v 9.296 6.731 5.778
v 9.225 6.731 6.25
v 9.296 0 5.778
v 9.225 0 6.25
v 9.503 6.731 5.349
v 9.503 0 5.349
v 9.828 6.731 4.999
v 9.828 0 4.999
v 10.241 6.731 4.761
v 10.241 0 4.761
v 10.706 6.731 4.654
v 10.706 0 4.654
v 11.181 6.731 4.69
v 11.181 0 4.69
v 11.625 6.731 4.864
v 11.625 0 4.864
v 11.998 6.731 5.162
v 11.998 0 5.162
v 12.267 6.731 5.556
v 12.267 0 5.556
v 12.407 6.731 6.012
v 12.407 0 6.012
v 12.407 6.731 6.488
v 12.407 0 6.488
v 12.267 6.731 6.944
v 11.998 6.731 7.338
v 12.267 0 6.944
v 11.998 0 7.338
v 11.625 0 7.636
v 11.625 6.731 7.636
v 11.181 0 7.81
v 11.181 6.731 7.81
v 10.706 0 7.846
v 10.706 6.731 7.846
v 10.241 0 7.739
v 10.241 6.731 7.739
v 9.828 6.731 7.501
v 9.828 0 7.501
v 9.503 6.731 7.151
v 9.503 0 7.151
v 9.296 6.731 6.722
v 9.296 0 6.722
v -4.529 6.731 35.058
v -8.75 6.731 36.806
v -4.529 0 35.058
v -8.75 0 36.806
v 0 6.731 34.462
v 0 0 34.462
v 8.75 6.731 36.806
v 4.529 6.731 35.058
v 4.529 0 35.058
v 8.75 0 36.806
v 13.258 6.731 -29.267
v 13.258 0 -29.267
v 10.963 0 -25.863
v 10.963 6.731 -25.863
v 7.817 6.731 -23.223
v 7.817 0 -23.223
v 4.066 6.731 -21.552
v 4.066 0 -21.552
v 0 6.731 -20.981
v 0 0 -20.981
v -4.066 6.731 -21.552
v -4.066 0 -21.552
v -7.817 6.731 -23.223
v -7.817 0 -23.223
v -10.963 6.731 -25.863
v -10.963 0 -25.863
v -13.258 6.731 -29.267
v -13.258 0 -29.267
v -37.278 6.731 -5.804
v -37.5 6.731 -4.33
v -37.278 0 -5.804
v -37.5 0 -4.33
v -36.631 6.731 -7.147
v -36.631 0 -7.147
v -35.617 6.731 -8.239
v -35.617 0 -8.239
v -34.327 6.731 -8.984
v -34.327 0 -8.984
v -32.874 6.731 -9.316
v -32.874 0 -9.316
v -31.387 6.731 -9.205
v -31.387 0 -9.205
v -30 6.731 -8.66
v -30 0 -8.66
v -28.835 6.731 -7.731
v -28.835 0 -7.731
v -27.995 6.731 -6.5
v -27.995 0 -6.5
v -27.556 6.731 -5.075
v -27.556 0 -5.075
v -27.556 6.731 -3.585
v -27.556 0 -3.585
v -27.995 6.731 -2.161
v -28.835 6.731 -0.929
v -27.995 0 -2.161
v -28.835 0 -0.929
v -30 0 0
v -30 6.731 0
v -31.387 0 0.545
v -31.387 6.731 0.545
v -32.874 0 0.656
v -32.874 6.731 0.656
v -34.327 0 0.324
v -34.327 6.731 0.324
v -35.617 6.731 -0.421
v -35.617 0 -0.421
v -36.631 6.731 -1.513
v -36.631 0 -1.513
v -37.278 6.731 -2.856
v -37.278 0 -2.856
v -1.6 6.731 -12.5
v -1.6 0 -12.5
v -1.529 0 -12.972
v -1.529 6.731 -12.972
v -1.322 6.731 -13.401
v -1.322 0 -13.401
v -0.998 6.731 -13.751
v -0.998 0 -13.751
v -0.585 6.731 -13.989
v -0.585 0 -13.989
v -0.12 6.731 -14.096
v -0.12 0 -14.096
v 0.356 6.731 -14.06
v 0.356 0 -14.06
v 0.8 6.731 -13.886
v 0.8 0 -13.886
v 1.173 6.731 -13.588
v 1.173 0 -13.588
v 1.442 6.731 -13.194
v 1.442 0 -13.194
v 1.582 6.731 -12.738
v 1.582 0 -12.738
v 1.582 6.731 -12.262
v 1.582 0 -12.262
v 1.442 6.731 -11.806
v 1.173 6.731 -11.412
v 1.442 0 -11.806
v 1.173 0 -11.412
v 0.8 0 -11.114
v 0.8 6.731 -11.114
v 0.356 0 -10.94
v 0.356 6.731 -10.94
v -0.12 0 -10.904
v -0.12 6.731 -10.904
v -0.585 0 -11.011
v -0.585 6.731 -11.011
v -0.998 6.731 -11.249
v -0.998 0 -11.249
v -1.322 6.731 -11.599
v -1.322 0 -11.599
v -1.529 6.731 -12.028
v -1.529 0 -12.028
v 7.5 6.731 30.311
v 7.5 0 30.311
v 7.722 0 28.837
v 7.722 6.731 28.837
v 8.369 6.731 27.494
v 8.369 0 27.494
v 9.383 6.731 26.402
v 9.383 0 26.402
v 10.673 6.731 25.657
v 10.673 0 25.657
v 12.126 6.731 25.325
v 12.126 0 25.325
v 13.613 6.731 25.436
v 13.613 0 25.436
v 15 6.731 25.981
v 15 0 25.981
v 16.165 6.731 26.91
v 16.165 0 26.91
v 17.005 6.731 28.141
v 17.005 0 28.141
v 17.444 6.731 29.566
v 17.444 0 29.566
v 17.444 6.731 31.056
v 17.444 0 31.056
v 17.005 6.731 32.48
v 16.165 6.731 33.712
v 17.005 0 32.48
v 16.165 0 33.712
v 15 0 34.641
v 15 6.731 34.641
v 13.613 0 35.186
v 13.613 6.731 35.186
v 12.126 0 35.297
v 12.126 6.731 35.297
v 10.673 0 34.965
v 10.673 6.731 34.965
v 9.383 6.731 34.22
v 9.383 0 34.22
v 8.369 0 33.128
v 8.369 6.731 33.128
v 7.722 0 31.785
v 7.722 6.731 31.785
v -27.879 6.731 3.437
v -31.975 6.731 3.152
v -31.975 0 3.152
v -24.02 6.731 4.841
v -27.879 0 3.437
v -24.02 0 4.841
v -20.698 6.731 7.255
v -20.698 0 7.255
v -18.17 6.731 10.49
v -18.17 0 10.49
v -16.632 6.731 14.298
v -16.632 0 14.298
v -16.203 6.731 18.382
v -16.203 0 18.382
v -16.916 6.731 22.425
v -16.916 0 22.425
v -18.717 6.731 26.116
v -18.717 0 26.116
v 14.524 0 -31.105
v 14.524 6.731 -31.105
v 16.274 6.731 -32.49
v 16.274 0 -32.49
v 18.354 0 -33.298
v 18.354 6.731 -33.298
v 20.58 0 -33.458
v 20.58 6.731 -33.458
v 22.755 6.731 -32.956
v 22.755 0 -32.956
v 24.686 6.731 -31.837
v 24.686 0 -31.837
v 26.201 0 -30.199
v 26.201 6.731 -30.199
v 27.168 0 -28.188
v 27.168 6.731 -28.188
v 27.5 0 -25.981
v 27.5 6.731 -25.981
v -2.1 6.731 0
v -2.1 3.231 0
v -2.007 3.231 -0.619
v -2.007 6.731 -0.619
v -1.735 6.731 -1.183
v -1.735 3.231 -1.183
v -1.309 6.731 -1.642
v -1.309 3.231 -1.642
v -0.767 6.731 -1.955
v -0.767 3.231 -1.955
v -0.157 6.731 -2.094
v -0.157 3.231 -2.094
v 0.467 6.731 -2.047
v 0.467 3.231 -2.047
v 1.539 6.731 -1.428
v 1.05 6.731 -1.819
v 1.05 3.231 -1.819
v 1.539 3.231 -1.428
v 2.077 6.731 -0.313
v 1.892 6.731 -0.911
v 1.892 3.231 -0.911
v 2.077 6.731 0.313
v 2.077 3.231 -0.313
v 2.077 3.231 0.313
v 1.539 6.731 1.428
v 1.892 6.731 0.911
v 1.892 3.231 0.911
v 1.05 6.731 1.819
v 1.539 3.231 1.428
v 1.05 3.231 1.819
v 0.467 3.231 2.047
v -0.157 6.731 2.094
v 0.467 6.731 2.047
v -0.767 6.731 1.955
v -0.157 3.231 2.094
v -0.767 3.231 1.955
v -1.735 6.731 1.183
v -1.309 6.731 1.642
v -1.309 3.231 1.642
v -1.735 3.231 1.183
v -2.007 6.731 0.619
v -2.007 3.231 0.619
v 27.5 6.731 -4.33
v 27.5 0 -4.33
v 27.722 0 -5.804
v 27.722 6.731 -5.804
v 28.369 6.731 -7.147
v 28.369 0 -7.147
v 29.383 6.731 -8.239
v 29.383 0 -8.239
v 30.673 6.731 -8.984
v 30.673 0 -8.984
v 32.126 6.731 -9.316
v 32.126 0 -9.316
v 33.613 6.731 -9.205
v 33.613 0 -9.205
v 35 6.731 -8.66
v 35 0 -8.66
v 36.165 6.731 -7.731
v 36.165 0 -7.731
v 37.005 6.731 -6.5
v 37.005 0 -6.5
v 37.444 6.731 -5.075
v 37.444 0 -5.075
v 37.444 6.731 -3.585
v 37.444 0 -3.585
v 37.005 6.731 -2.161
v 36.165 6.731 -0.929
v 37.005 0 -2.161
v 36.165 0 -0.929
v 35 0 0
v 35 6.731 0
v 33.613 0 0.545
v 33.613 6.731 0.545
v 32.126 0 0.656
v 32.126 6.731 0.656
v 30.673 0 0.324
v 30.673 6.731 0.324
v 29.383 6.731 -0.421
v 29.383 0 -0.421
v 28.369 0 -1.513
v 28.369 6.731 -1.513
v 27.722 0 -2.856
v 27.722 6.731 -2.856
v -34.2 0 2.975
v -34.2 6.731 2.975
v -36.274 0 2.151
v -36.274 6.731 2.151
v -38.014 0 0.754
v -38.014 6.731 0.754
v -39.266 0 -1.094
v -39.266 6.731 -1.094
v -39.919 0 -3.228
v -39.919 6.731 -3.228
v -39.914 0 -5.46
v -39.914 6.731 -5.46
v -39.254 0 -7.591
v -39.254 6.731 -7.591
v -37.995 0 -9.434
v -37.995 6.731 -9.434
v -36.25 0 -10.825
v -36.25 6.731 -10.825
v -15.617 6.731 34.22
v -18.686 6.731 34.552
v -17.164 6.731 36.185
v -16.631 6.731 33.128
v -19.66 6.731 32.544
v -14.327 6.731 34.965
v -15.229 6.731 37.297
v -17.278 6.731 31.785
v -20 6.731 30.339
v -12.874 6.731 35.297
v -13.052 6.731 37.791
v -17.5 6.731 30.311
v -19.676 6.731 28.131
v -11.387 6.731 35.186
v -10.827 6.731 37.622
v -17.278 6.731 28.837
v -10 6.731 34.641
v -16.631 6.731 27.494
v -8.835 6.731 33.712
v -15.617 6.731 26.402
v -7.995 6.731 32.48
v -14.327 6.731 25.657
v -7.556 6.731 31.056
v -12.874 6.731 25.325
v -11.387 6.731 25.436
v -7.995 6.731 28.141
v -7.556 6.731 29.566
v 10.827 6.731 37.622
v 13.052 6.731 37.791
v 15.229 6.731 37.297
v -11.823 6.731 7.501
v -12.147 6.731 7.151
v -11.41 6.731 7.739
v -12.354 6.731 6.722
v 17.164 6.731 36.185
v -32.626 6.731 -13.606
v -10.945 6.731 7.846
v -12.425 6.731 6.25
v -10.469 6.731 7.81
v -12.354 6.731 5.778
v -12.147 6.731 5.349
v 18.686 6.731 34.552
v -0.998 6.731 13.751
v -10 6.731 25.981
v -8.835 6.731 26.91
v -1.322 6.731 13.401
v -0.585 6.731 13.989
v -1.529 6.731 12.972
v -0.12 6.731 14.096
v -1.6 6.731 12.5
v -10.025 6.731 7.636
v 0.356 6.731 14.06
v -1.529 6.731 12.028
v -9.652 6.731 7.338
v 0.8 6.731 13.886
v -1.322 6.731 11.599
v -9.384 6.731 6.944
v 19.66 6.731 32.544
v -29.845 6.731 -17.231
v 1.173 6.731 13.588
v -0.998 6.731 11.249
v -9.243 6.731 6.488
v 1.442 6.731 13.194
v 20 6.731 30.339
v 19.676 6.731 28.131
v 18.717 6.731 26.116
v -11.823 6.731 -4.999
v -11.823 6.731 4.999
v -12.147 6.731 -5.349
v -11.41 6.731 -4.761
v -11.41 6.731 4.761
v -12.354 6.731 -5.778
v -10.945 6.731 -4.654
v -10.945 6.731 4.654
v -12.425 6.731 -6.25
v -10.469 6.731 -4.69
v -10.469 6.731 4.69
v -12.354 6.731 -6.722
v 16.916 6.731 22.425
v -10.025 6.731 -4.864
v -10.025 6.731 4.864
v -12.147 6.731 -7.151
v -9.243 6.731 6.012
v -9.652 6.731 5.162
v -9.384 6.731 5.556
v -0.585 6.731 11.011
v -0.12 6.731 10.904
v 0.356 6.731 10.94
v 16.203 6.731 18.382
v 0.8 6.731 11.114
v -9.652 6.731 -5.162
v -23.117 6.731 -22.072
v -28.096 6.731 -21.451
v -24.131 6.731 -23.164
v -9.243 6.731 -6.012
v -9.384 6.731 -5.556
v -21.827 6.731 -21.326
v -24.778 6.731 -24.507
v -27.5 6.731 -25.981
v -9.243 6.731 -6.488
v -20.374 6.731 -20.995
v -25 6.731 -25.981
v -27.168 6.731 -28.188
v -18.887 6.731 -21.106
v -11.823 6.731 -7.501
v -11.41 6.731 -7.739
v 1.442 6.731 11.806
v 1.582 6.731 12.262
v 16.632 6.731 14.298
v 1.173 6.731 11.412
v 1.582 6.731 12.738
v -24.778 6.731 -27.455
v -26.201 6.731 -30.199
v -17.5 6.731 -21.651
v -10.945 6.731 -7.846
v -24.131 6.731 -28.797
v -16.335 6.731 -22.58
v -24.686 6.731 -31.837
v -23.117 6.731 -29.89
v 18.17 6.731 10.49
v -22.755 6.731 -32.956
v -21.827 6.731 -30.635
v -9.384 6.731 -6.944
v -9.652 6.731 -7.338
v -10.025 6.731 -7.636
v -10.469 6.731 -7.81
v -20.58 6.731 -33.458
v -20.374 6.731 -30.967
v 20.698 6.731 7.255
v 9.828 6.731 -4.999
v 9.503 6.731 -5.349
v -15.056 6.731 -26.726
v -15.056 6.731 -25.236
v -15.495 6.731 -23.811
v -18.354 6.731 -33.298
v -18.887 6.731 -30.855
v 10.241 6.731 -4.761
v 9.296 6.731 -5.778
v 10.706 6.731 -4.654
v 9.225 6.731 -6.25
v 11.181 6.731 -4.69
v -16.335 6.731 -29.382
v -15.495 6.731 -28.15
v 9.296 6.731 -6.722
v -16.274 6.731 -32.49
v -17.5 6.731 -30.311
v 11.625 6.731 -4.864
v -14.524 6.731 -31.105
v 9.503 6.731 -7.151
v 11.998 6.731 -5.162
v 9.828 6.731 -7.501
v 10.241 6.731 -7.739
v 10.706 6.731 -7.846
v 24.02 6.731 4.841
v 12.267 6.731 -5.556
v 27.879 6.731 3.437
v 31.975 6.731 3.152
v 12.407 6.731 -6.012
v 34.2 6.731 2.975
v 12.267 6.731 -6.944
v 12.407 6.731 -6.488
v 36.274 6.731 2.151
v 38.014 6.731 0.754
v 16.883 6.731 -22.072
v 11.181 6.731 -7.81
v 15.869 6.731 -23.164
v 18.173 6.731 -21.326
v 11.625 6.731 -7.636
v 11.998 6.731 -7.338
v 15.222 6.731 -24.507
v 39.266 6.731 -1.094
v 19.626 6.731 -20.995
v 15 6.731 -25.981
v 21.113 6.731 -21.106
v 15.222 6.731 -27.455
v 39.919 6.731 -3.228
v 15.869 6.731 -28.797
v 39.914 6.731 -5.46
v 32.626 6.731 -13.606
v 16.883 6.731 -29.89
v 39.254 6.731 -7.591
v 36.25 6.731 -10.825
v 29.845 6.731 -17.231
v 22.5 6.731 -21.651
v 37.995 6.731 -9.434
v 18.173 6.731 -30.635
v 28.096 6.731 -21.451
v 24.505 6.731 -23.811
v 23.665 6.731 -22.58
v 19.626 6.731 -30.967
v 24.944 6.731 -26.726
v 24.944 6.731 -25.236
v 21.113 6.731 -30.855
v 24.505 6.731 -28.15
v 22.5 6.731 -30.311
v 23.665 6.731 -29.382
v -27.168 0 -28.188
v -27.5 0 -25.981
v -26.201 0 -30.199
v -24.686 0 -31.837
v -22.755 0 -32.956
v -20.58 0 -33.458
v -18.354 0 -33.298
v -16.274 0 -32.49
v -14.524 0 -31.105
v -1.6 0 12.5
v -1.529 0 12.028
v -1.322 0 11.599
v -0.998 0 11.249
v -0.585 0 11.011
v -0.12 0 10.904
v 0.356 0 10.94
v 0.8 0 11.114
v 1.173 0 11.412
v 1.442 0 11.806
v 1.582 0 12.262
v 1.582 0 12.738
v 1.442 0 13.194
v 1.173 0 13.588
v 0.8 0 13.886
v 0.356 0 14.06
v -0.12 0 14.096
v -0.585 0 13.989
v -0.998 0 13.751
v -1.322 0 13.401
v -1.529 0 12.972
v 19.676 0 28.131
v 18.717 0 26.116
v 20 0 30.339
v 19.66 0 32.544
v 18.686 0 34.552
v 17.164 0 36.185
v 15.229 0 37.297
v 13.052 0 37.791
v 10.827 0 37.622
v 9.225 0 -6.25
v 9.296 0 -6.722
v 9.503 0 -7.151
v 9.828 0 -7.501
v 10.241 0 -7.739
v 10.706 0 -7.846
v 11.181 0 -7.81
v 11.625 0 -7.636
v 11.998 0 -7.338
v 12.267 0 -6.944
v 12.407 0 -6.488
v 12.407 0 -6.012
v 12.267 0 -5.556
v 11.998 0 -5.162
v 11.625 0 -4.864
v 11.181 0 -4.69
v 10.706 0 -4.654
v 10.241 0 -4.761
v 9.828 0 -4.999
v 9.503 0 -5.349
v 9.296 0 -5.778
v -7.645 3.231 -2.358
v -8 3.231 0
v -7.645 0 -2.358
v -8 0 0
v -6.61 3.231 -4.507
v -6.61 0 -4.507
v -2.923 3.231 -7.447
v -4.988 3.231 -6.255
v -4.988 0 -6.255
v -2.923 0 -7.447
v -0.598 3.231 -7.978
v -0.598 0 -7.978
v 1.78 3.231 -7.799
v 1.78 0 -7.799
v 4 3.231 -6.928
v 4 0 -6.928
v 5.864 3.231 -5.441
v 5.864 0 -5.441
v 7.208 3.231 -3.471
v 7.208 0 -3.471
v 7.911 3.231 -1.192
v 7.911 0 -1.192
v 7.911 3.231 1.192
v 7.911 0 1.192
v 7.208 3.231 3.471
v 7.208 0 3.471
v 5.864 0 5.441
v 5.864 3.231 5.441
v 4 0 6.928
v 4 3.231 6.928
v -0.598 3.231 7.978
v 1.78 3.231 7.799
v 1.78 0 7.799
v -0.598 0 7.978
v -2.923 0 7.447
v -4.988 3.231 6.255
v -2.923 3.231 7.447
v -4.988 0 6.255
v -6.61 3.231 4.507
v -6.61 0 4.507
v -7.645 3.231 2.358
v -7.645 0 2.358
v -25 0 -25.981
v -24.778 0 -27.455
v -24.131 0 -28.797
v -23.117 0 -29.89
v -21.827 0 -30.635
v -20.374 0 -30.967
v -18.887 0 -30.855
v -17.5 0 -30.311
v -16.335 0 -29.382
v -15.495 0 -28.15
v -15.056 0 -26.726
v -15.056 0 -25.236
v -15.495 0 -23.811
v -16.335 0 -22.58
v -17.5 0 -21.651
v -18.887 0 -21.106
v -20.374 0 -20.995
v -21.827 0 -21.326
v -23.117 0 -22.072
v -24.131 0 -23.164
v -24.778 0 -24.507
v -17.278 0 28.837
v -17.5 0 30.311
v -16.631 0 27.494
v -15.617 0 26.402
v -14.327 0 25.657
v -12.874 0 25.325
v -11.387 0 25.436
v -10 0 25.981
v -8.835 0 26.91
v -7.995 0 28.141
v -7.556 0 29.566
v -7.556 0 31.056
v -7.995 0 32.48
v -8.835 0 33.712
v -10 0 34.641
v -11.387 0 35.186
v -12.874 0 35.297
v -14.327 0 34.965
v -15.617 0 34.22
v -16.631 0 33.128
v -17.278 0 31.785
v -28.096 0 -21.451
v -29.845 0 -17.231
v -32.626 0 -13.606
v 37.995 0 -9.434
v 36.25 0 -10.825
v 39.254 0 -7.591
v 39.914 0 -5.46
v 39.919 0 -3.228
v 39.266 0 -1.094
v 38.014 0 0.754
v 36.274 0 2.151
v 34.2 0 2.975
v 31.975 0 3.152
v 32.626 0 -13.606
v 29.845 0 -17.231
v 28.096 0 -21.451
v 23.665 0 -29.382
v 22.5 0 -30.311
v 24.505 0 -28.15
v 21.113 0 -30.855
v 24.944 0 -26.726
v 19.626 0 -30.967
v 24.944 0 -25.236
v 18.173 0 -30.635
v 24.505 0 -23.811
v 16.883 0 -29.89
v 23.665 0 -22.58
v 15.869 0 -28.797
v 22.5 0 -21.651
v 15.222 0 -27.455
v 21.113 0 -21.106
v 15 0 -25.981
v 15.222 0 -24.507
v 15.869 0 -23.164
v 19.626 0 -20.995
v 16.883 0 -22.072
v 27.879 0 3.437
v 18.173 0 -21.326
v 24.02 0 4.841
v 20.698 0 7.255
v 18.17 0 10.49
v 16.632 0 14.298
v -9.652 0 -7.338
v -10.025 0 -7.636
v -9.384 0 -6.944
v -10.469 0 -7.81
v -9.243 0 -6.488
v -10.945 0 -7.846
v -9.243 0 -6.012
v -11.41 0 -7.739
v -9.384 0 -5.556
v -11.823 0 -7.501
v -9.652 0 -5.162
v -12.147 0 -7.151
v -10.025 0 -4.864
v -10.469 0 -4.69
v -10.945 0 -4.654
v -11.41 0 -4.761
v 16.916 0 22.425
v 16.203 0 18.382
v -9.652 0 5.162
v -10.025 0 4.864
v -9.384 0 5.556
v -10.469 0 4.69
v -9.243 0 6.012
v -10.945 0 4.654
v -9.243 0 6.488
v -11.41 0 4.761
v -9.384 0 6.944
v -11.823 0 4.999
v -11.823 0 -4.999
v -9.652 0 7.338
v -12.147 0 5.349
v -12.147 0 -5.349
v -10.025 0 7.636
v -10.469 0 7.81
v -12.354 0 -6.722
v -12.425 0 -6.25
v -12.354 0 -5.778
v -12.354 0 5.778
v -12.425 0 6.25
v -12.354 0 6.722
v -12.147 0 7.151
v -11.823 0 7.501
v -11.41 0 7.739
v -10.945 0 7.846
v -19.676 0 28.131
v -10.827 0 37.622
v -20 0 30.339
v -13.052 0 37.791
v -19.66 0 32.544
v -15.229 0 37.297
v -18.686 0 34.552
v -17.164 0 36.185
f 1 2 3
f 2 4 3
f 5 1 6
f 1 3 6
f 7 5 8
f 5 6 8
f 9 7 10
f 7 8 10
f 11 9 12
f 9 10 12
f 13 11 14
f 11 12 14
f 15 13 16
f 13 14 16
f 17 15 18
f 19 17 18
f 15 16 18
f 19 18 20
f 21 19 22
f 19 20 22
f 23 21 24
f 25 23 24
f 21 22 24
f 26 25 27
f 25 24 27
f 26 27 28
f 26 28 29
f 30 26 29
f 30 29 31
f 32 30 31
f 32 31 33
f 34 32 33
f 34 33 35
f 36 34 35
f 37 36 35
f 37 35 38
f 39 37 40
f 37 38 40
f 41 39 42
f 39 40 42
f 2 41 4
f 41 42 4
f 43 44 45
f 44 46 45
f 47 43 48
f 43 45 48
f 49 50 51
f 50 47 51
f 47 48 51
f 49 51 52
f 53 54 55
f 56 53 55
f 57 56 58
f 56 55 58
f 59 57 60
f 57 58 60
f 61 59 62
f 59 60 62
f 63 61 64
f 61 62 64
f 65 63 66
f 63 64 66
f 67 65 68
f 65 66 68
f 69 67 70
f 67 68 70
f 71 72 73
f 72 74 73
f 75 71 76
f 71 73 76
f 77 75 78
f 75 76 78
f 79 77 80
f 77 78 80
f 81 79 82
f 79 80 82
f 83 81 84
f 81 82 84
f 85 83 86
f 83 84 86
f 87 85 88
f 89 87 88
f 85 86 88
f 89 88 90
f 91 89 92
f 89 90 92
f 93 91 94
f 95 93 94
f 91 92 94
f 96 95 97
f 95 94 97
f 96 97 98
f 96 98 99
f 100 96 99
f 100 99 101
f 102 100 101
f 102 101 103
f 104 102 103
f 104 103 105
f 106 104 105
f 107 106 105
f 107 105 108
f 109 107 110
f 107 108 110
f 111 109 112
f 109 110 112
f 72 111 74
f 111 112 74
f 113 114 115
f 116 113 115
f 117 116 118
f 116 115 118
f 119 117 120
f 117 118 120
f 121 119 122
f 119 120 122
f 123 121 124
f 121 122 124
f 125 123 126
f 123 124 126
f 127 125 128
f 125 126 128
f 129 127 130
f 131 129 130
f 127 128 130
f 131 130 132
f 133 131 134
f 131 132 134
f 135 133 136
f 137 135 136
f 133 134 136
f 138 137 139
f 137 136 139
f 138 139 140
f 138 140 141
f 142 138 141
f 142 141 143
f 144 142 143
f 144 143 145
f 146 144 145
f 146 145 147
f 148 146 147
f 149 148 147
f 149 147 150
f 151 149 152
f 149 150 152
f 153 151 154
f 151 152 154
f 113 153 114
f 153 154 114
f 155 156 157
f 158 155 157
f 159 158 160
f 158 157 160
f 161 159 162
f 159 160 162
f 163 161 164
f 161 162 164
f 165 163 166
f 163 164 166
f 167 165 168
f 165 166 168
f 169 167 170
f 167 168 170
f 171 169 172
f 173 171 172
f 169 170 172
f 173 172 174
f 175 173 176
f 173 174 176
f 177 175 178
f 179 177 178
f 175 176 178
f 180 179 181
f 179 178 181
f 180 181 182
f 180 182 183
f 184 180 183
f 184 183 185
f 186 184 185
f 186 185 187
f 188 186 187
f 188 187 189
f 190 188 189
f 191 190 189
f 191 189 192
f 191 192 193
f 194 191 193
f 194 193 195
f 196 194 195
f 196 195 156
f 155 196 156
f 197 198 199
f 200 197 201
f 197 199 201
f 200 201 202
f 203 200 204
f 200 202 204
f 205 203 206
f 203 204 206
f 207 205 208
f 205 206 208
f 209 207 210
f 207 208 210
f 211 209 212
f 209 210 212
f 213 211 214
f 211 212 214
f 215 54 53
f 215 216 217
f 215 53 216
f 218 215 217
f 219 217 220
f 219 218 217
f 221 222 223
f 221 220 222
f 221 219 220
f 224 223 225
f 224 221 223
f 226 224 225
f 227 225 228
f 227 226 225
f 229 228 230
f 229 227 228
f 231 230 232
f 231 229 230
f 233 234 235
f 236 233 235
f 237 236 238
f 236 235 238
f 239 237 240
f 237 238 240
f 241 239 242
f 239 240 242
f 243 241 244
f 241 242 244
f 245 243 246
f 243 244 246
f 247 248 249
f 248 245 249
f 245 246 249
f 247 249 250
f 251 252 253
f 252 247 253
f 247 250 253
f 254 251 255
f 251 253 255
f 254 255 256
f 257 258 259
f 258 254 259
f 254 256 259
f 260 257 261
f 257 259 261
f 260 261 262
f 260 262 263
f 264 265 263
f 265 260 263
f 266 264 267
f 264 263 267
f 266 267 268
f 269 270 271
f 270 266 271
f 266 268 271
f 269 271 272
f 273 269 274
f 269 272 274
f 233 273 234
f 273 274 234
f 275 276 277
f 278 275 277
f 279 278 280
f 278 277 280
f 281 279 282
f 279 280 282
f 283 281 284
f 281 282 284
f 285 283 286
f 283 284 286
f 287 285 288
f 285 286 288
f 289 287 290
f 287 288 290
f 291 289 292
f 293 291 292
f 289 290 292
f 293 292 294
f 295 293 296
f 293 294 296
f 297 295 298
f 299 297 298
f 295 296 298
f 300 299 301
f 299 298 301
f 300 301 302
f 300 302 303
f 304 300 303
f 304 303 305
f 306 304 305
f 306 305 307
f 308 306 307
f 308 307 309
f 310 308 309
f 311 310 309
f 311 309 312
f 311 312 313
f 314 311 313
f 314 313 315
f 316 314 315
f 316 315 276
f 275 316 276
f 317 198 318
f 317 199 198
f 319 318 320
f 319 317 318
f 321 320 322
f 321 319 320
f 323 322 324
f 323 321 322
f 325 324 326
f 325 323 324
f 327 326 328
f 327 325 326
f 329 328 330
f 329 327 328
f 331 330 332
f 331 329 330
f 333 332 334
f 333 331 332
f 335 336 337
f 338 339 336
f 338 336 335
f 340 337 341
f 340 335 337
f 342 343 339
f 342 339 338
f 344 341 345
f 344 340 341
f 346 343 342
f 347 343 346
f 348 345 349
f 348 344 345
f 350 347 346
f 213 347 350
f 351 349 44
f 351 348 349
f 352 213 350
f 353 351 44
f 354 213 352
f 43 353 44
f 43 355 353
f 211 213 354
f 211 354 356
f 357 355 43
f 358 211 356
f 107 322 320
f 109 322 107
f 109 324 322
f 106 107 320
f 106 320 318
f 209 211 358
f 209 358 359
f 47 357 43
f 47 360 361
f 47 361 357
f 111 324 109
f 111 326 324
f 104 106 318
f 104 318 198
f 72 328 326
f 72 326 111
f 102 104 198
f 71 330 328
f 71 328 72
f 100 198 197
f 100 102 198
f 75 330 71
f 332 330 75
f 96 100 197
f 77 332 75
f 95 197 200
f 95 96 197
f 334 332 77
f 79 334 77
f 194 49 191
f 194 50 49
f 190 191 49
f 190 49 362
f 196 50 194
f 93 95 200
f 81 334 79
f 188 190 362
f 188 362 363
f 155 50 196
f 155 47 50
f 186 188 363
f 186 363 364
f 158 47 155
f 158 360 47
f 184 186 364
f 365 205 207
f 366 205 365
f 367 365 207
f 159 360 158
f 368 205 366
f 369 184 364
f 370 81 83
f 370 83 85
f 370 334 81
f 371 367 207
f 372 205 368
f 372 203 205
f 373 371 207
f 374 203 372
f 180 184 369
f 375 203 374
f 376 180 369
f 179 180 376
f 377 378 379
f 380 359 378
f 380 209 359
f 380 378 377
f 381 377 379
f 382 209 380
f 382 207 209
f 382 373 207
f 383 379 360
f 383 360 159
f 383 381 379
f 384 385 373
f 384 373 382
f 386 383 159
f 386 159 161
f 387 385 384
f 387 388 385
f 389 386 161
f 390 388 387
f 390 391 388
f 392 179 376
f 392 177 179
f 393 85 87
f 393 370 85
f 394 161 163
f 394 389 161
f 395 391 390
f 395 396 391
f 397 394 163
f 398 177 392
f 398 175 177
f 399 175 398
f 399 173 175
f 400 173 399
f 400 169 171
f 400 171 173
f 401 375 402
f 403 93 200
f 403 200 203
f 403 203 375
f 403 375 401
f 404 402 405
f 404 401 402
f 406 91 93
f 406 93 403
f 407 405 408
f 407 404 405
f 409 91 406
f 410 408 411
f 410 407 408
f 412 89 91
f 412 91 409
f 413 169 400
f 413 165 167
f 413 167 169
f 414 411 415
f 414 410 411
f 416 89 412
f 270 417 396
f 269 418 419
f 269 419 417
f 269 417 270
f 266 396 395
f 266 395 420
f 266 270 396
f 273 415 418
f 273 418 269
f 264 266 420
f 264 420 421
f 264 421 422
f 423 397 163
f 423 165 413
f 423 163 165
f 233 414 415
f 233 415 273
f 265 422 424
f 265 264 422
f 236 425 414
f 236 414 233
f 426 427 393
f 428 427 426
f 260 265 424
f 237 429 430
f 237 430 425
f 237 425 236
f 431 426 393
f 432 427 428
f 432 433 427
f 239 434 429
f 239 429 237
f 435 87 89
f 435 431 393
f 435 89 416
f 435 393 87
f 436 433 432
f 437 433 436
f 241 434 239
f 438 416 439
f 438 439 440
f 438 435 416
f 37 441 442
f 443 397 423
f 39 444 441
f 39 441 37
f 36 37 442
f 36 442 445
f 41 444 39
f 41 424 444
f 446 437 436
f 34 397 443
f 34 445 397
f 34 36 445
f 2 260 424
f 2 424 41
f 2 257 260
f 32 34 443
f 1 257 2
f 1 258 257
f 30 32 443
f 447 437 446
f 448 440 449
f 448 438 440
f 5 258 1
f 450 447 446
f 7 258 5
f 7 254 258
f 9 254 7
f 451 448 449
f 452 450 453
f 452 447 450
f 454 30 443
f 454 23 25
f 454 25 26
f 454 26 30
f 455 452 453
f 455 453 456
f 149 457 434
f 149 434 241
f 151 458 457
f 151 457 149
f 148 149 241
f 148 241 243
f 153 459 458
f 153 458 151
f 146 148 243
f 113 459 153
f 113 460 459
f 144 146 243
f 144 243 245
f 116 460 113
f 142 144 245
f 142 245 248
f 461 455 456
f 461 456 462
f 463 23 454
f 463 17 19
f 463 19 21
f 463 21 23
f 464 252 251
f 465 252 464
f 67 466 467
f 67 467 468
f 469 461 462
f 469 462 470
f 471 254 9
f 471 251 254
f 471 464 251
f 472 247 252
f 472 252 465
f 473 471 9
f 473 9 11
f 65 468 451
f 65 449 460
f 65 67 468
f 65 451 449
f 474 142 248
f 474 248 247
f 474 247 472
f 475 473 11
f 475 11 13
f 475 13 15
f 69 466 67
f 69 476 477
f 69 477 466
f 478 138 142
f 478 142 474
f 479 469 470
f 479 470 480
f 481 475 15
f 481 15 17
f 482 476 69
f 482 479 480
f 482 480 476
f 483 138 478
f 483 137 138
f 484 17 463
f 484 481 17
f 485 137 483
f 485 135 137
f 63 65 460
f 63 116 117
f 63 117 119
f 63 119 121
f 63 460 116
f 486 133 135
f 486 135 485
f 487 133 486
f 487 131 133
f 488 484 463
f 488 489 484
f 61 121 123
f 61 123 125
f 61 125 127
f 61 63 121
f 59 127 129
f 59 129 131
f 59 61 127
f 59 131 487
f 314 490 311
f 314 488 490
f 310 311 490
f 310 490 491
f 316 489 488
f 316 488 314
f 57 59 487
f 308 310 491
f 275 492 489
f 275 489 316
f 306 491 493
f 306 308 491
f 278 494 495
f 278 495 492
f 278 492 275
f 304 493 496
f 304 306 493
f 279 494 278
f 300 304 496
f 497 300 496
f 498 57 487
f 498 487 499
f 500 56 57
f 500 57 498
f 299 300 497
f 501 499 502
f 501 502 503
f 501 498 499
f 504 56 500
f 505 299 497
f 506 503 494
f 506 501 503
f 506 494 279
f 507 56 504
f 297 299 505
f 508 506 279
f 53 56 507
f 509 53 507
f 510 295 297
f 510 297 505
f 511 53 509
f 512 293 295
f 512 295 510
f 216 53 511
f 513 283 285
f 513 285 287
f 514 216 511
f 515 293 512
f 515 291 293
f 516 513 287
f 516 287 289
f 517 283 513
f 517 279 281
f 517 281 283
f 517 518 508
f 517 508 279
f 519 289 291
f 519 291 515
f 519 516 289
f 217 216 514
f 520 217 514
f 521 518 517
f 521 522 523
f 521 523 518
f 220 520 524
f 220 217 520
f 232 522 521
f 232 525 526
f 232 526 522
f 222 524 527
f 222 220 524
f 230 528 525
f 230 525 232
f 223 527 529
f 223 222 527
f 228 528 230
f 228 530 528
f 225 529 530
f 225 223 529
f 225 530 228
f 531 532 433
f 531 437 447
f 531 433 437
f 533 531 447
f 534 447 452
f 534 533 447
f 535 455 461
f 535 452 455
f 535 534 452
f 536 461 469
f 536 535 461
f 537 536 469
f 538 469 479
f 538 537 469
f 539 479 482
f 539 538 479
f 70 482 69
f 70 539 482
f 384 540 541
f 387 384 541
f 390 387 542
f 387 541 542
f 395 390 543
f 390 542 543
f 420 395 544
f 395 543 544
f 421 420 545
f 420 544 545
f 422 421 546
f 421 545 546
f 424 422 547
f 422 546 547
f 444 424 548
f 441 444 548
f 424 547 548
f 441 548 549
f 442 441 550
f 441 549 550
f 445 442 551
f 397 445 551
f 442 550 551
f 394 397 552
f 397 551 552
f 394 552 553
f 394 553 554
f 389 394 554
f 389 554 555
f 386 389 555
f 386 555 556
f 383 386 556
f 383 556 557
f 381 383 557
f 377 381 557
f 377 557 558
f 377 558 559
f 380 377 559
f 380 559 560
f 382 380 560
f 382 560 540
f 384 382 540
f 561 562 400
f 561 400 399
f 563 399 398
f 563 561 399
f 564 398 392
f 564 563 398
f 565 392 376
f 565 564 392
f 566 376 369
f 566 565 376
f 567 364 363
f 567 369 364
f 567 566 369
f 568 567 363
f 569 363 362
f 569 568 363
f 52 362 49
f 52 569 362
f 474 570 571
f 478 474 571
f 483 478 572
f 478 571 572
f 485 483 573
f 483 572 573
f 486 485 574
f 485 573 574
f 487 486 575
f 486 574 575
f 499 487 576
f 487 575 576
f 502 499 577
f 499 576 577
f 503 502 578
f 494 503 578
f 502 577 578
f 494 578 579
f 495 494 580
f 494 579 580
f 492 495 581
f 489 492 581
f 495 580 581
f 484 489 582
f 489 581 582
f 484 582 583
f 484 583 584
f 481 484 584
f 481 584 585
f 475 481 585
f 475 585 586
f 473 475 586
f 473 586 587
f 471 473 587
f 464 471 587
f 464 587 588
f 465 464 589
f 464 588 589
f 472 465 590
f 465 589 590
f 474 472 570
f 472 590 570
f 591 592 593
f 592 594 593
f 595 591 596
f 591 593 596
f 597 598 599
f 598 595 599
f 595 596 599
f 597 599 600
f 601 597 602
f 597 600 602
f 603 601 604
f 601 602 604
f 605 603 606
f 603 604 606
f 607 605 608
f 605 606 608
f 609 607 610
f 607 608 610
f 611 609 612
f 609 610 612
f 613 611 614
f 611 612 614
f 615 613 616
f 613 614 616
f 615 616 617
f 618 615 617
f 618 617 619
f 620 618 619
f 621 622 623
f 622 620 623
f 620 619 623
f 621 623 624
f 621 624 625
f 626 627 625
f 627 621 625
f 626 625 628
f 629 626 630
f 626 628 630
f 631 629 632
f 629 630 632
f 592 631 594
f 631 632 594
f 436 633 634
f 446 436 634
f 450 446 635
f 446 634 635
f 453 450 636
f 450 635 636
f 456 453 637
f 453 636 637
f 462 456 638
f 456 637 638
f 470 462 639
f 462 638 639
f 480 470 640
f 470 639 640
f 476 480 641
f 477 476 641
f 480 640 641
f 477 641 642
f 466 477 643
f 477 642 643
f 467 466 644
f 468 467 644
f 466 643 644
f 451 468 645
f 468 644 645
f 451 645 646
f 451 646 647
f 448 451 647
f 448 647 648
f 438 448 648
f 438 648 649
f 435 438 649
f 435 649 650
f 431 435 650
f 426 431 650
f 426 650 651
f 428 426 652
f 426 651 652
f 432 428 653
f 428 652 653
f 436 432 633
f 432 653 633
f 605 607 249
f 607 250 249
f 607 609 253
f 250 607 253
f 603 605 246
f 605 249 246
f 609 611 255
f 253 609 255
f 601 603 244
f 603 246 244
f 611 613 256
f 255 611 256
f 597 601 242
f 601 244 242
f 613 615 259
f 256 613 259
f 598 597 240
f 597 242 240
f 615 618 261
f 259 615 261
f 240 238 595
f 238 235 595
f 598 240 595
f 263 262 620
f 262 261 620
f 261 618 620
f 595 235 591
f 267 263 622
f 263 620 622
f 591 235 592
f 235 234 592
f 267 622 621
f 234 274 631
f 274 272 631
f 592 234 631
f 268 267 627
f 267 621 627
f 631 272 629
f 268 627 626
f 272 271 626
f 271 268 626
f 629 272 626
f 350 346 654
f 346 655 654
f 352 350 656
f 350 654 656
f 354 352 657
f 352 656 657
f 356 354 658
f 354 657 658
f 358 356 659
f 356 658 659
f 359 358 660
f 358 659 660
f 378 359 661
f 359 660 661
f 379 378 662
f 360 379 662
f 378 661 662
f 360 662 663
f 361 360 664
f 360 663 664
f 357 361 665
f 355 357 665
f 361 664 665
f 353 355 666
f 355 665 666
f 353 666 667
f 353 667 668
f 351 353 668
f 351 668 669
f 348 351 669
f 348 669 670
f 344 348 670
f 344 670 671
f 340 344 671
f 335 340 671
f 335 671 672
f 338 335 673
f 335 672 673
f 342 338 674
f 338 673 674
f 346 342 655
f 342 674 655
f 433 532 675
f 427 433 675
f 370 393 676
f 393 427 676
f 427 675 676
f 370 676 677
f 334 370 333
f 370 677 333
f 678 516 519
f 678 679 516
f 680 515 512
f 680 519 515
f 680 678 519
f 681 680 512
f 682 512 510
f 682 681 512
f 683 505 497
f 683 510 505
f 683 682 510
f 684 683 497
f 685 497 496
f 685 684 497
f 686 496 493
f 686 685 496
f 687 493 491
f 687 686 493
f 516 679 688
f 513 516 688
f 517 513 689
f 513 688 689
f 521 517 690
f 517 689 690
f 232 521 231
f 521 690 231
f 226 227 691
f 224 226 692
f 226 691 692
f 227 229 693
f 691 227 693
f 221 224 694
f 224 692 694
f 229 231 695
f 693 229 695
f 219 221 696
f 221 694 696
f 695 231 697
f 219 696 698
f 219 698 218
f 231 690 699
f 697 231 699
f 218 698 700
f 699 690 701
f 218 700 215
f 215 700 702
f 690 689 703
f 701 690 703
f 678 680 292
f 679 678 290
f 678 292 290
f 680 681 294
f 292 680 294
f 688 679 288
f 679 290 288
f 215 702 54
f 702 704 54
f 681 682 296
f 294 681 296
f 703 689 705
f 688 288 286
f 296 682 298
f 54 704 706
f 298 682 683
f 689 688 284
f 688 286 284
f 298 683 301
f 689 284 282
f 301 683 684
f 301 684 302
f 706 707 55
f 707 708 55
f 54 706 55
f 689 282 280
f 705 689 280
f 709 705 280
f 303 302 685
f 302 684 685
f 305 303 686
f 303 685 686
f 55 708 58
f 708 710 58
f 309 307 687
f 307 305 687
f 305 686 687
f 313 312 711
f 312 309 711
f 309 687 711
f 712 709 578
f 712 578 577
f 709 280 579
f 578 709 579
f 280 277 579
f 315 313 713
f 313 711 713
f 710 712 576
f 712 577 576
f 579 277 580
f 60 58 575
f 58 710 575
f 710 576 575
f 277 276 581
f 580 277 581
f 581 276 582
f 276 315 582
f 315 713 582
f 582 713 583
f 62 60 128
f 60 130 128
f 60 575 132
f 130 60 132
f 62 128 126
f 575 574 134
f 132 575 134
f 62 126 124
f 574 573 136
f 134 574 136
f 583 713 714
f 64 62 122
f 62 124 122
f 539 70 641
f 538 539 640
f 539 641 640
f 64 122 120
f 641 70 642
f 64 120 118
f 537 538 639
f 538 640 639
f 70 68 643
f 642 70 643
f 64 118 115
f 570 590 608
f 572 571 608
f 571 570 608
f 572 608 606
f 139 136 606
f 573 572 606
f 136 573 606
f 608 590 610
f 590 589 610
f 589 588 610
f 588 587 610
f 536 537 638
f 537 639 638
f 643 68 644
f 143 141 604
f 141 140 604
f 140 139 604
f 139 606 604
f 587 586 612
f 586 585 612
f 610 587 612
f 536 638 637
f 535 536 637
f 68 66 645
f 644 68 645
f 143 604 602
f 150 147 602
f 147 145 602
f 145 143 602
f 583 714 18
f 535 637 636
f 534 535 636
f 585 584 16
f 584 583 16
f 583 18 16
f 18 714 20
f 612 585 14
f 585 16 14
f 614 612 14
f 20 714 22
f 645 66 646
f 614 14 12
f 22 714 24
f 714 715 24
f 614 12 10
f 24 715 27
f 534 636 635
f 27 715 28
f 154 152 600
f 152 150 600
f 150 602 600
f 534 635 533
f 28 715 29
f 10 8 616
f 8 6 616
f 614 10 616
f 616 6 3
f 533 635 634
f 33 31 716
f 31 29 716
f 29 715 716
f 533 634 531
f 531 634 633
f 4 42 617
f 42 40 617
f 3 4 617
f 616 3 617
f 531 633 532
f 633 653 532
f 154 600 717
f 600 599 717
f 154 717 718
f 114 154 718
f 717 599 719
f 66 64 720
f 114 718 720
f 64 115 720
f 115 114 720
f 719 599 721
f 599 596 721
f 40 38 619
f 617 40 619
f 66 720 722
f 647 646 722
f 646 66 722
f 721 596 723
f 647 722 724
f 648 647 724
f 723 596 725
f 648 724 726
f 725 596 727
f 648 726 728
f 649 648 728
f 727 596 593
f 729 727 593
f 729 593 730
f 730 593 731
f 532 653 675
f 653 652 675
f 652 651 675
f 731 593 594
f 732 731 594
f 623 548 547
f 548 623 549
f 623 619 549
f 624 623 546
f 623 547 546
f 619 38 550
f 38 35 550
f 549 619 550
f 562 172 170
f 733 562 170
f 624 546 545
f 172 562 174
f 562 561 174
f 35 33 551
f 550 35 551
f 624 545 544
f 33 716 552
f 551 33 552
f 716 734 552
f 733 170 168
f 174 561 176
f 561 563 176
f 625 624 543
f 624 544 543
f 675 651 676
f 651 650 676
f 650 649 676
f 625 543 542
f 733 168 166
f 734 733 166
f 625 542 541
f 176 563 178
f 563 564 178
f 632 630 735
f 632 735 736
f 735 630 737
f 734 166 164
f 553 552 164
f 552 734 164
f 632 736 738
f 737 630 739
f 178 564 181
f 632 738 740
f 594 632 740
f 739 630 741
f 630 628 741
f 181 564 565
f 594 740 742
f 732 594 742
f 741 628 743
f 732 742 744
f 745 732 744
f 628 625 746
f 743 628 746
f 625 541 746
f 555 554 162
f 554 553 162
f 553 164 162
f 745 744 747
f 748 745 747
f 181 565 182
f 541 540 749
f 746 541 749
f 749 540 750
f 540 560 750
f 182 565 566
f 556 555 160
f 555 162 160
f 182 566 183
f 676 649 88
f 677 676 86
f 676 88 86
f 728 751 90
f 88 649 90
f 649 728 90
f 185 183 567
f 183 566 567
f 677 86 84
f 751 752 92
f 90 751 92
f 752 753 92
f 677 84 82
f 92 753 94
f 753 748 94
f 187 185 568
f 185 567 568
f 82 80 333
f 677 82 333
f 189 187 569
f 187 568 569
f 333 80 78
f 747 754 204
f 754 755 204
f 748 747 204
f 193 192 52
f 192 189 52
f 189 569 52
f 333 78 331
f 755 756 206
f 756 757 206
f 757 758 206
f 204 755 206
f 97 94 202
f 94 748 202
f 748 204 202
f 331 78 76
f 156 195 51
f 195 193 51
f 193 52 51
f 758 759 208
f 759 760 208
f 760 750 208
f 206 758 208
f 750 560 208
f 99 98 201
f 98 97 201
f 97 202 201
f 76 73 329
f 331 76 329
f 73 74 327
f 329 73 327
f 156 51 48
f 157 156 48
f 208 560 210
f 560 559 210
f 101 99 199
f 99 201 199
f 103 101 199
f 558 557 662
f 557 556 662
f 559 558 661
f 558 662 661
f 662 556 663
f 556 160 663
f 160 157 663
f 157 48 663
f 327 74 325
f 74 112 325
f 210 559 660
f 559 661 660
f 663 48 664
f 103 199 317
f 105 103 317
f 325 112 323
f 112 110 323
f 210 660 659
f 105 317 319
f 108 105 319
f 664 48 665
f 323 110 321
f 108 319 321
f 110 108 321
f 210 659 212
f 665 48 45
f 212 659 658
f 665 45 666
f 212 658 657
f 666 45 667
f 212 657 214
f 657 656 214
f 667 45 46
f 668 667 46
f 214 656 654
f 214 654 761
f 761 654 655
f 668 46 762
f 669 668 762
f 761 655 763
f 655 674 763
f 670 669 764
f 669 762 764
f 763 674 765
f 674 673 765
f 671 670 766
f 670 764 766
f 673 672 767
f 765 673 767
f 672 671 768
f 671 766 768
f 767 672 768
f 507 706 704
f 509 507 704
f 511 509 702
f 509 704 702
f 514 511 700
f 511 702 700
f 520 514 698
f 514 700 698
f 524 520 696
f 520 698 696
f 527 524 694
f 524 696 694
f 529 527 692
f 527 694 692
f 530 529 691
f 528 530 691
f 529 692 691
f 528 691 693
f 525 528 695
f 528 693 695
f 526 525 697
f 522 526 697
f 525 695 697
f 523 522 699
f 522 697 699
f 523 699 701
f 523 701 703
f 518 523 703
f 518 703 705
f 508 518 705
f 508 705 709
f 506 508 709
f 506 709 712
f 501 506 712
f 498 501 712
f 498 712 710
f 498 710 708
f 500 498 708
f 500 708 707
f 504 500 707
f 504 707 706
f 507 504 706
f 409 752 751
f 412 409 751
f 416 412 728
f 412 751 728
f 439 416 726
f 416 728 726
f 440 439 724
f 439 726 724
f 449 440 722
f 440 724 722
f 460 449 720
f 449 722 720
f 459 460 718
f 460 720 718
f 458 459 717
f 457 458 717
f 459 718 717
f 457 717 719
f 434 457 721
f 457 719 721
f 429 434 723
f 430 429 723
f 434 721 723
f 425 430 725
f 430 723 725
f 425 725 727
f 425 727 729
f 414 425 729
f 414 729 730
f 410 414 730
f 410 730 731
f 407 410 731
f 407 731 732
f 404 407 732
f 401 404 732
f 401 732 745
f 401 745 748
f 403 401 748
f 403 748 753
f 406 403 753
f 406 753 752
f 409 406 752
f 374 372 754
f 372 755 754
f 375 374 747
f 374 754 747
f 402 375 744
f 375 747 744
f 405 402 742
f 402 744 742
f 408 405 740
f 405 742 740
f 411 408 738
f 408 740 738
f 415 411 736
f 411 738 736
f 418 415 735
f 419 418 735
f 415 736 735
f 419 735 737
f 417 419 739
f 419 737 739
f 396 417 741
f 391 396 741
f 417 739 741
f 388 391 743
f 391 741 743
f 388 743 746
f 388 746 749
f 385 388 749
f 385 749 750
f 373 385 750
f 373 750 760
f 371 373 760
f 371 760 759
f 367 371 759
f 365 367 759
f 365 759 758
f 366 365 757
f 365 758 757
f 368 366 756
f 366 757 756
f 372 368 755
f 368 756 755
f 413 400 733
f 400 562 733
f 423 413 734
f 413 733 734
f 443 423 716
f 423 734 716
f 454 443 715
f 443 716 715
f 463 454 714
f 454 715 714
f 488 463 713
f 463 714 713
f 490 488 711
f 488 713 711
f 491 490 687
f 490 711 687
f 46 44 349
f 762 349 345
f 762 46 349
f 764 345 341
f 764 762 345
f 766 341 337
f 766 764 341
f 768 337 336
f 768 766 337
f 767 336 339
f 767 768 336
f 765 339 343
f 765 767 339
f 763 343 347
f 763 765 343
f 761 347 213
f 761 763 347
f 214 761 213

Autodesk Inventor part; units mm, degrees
ref_plane "YZ Plane" through (0, 0, 0) normal (1, 0, 0) x (0, 1, 0)
ref_plane "XZ Plane" through (0, 0, 0) normal (0, 1, 0) x (-1, 0, 0)
ref_plane "XY Plane" through (0, 0, 0) normal (0, 0, 1) x (1, 0, 0)
sketch "Sketch1" plane through (0, 0, 0) normal (0, 1, 0) x (-1, 0, 0)
  circle A0 centre (0, 0) radius 2.1
  circle A1 centre (0, 0) radius 8
  circle A2 centre (0, 0) radius 12.5
  circle A3 centre (0, 0) radius 51.9615
  line L0 (-45, -25.9808) -> (-28.034, 3.4052)
  line L1 (0, 51.9615) -> (16.966, 22.5755)
  line L2 (45, -25.9808) -> (11.068, -25.9808)
  circle A4 centre (12.5, 30.3109) radius 5
  circle A5 centre (32.5, -4.3301) radius 5
  circle A6 centre (-12.5, 30.3109) radius 5
  circle A7 centre (-32.5, -4.3301) radius 5
  circle A8 centre (-20, -25.9808) radius 5
  circle A9 centre (20, -25.9808) radius 5
  circle A10 centre (0, 12.5) radius 1.6
  circle A11 centre (-10.8253, 6.25) radius 1.6
  circle A12 centre (-10.8253, -6.25) radius 1.6
  circle A13 centre (0, -12.5) radius 1.6
  circle A14 centre (10.8253, -6.25) radius 1.6
  circle A15 centre (10.8253, 6.25) radius 1.6
  circle A16 centre (-32.5, -4.3301) radius 7.5
  circle A17 centre (-12.5, 30.3109) radius 7.5
  circle A18 centre (12.5, 30.3109) radius 7.5
  circle A19 centre (32.5, -4.3301) radius 7.5
  circle A20 centre (20, -25.9808) radius 7.5
  circle A21 centre (-20, -25.9808) radius 7.5
  arc A22 (-8.75, 36.8061) -> (8.75, 36.8061) centre (0, 51.9615) ccw
  arc A23 (-27.5, -25.9808) -> (-36.25, -10.8253) centre (-45, -25.9808) ccw
  arc A24 (36.25, -10.8253) -> (27.5, -25.9808) centre (45, -25.9808) ccw
  arc A25 (13.2584, -29.2673) -> (-13.2584, -29.2673) centre (0, -35.7308) ccw
  arc A26 (-31.9754, 3.1515) -> (-18.717, 26.1158) centre (-30.9437, 17.8654) ccw
  arc A27 (18.717, 26.1158) -> (31.9754, 3.1515) centre (30.9437, 17.8654) ccw
  line L3 (-16.966, 22.5755) -> (0, 51.9615)
  line L4 (-28.034, 3.4052) -> (-16.966, 22.5755)
  line L5 (-11.068, -25.9808) -> (-45, -25.9808)
  line L6 (11.068, -25.9808) -> (-11.068, -25.9808)
  line L7 (16.966, 22.5755) -> (28.034, 3.4052)
  line L8 (28.034, 3.4052) -> (45, -25.9808)
  circle A28 centre (14.0253, 0) radius 1.6
  point P0 (-28.75, 2.1651)
  point P1 (-16.25, 23.8157)
  point P2 (16.25, 23.8157)
  point P3 (28.75, 2.1651)
  point P4 (12.5, -25.9808)
  point P5 (-12.5, -25.9808)
  dimension "d4" = 25
  dimension "d0" = 4.2
  dimension "d3" = 16
  dimension "d11" = 90
  dimension "d12" = 40
  dimension "d13" = 10
  dimension "d14" = 25
  dimension "d15" = 25
  dimension "d16" = 40
  dimension "d17" = 40
  dimension "d18" = 25
  dimension "d19" = 25
  dimension "d26" = 3.2
  dimension "d29" = 360
  dimension "d38" = 15
  dimension "d47" = 5
  dimension "d48" = 90
  dimension "d49" = 90
  dimension "d50" = 6.25
  dimension "d51" = 3.2
extrude "Shape" add sketch "Sketch1" along normal blind 6.731 contours A1 | A2 A28 | A2 A28 | A28 A2 A14 A13 A12 A11 A10 A15 | A15 A2 | A2 A15 | A14 A2 | A2 A14 | A10 A2 | A2 A10 | A13 A2 | A2 A13 | A11 A2 | A2 A11 | A12 A2 | A2 A12 | A18 L1 A4 | L1 A4 A18 | A18 L1 A27 L8 A19 A24 A20 L2 A25 L5 A21 A23 A16 L0 A26 L3 A17 A22 | L3 A6 A17 | A17 L3 A6 | A20 L2 A9 | L2 A9 A20 | L8 A5 A19 | A19 L8 A5 | A16 L0 A7 | L0 A7 A16 | L5 A8 A21 | A21 L5 A8 | A4 L1 | L1 A4 | A18 A27 L1 | A17 L3 A26 | L3 A6 | A6 L3 | A9 L2 | L2 A9 | A25 L2 A20 | L8 A27 A19 | L8 A5 | A5 L8 | A7 L0 | L0 A7 | A26 L0 A16 | L5 A25 A21 | L5 A8 | A8 L5
extrude "Holes" cut sketch "Sketch1" along normal up to next contours A2 A28 | A2 A28 | A15 A2 | A2 A15 | A14 A2 | A2 A14 | A10 A2 | A2 A10 | A13 A2 | A2 A13 | A11 A2 | A2 A11 | A12 A2 | A2 A12 | A4 L1 | L1 A4 | L3 A6 | A6 L3 | A9 L2 | L2 A9 | L8 A5 | A5 L8 | A7 L0 | L0 A7 | L5 A8 | A8 L5
extrude "Inset" cut sketch "Sketch1" along normal blind 3.231 contours A1
sketch "Sketch2" plane through (0, 6.731, 0) normal (0, 1, 0) x (1, 0, 0)
  circle A0 centre (-14.0253, 0) radius 1.6 projected
extrude "Extrusion7" add sketch "Sketch2" against normal up to surface (6.731 mm away)
equation "\"d14\" = d15"
equation "\"d16\" = d12"
equation "\"d17\" = d12"
equation "\"d18\" = d14"
equation "\"d19\" = d14"
equation "\"d48\" = d11"
equation "\"d49\" = d11"
equation "\"d43\" = THICKB"
equation "\"THICKA\" = 3.175"
equation "\"THICKB\" = 6.731"
equation "\"THICKC\" = 12.7"
equation "\"MAGDIA\" = 9.5"
equation "\"BALLDIA\" = 12"
properties part number "Effector_Platform"
